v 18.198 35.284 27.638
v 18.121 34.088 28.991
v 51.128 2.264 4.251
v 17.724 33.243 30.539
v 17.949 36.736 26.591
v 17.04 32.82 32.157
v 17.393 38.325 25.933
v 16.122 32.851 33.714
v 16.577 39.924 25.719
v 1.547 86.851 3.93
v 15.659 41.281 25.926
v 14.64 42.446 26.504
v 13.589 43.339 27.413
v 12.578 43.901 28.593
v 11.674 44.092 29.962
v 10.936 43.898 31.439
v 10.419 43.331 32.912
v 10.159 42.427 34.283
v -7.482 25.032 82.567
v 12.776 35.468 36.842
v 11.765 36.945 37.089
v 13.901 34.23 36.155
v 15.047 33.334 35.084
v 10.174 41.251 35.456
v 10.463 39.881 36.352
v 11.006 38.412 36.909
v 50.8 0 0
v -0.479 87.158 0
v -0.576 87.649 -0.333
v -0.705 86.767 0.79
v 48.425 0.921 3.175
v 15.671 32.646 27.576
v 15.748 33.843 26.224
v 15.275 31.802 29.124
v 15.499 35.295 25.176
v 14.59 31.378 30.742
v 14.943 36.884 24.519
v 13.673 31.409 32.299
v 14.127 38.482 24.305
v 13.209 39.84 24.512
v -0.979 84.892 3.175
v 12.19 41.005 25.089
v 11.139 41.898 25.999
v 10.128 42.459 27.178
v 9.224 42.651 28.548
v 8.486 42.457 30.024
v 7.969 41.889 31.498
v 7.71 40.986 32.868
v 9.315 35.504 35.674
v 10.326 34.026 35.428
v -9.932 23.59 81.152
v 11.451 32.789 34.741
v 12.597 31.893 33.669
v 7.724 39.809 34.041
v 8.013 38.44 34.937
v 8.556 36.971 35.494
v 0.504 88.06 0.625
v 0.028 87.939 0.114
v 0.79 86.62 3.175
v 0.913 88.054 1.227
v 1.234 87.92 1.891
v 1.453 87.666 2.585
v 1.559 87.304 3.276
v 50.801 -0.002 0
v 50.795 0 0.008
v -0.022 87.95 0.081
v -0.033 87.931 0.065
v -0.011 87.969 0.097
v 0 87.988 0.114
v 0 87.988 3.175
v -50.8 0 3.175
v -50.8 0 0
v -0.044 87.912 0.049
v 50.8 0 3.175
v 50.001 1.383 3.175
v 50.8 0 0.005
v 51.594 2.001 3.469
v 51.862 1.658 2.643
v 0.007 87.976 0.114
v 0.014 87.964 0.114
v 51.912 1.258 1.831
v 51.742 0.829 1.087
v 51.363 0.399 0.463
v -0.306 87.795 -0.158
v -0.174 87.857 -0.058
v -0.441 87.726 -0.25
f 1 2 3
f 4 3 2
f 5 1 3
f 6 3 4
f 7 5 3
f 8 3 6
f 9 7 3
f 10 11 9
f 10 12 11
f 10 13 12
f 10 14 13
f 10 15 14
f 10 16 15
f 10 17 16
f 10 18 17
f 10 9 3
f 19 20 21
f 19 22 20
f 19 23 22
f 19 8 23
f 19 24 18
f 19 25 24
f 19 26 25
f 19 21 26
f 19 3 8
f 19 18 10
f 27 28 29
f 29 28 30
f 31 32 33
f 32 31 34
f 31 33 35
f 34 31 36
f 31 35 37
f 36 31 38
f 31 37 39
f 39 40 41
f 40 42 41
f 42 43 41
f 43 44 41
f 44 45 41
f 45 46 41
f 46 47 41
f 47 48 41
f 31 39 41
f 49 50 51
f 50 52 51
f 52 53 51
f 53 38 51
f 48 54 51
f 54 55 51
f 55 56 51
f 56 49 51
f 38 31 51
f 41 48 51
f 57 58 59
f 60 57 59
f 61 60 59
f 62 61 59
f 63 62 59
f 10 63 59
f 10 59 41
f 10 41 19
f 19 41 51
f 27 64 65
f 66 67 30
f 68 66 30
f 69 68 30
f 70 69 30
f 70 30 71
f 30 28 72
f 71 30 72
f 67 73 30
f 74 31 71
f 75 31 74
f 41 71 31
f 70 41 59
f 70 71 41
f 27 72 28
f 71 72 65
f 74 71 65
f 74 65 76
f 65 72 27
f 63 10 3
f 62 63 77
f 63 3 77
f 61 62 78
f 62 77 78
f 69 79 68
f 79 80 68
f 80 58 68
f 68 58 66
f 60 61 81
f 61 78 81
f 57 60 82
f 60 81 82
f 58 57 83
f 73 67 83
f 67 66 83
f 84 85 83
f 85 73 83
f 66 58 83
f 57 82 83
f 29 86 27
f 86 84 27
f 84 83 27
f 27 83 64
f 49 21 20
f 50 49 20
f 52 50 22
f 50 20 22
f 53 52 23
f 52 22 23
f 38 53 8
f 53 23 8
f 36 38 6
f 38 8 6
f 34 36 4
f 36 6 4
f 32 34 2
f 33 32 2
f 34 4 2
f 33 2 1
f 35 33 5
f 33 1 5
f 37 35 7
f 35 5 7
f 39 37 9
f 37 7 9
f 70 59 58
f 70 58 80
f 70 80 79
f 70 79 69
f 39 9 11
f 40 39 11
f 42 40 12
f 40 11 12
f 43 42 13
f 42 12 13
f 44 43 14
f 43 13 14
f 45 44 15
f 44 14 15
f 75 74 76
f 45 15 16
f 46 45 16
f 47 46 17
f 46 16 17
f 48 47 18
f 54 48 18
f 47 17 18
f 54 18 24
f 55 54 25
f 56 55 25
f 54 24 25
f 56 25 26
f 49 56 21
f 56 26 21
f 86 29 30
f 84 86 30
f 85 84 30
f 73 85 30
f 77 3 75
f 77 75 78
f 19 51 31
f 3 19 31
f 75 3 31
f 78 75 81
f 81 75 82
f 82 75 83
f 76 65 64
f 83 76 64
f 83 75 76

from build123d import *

# Parameters (mm, degrees)
F1_DEPTH    = 3.175
F5_DEPTH    = 3.175
F6_T1_DEPTH = 117.475
F8_DEPTH    = 3.175


# Not quite as in the source:
# - a fillet or chamfer that OpenCascade refuses, or shapes differently, is made with other operations: its cross-section is extruded or revolved along the edge and cut away or added


with BuildPart() as f1:
    # F0 (on Top) → F1 (new body)
    with BuildSketch(Plane.XY):
        Polygon((50.8, 0), (0, 87.9881810245), (-50.8, 0), align=None)
    extrude(amount=F1_DEPTH)

    # F4 (on line) → F5 (join)
    with BuildSketch(Plane(origin=(30.2473107364, 17.7959839325, 17.4632910558), x_dir=(-0.3931673168, 0.8910065242, -0.226995231), z_dir=(0.7716343063, 0.4539904997, 0.445503225))):
        Polygon((6.5029600393, 75.2459340132), (-19.9755570322, -25.4006840255), (78.3980433443, 0), align=None)
    extrude(amount=F5_DEPTH)

    # F6: fillet of radius 3.175 on 1 edges, made by hand

    # F6_s2 → F6_t1 (cut)
    with BuildSketch(Plane(origin=(17.005719551, -29.012184774, 0.1101218851), x_dir=(-0.862716434, -0.5056880012, 0), z_dir=(-0.5056852899, 0.8627118085, -0.0032746052))):
        with BuildLine():
            ThreePointArc((-45.25402581, 4.1728704395), (-45.421662158, 1.7486197382), (-43.8259948462, -0.0841211704))
            Line((-43.8259948462, -0.0841211704), (-46.668506133, 1.3303591527))
            Line((-46.668506133, 1.3303591527), (-45.25402581, 4.1728704395))
        make_face()
    extrude(amount=F6_T1_DEPTH, mode=Mode.SUBTRACT)

    # F7 (on face) → F8 (cut, through all)
    with BuildSketch(Plane(origin=(32.697249659, 19.2374037692, 18.877763795), x_dir=(-0.3931673168, 0.8910065242, -0.226995231), z_dir=(0.7716343063, 0.4539904997, 0.445503225))):
        with BuildLine():
            ThreePointArc((23.2165575735, 13.9849704437), (26.5917627129, 16.2568894847), (27.8951978201, 20.1110668007))
            ThreePointArc((27.8951978201, 20.1110668007), (25.399375136, 25.1576316934), (19.8738380667, 26.2371631576))
            Line((19.8738380667, 26.2371631576), (23.2165575735, 13.9849704437))
        make_face()
        with BuildLine():
            Line((23.2165575735, 13.9849704437), (19.8738380667, 26.2371631576))
            ThreePointArc((19.8738380667, 26.2371631576), (15.4191014631, 18.4397070472), (23.2165575735, 13.9849704437))
        make_face()
    extrude(amount=-F8_DEPTH, mode=Mode.SUBTRACT)


solid = f1.part
